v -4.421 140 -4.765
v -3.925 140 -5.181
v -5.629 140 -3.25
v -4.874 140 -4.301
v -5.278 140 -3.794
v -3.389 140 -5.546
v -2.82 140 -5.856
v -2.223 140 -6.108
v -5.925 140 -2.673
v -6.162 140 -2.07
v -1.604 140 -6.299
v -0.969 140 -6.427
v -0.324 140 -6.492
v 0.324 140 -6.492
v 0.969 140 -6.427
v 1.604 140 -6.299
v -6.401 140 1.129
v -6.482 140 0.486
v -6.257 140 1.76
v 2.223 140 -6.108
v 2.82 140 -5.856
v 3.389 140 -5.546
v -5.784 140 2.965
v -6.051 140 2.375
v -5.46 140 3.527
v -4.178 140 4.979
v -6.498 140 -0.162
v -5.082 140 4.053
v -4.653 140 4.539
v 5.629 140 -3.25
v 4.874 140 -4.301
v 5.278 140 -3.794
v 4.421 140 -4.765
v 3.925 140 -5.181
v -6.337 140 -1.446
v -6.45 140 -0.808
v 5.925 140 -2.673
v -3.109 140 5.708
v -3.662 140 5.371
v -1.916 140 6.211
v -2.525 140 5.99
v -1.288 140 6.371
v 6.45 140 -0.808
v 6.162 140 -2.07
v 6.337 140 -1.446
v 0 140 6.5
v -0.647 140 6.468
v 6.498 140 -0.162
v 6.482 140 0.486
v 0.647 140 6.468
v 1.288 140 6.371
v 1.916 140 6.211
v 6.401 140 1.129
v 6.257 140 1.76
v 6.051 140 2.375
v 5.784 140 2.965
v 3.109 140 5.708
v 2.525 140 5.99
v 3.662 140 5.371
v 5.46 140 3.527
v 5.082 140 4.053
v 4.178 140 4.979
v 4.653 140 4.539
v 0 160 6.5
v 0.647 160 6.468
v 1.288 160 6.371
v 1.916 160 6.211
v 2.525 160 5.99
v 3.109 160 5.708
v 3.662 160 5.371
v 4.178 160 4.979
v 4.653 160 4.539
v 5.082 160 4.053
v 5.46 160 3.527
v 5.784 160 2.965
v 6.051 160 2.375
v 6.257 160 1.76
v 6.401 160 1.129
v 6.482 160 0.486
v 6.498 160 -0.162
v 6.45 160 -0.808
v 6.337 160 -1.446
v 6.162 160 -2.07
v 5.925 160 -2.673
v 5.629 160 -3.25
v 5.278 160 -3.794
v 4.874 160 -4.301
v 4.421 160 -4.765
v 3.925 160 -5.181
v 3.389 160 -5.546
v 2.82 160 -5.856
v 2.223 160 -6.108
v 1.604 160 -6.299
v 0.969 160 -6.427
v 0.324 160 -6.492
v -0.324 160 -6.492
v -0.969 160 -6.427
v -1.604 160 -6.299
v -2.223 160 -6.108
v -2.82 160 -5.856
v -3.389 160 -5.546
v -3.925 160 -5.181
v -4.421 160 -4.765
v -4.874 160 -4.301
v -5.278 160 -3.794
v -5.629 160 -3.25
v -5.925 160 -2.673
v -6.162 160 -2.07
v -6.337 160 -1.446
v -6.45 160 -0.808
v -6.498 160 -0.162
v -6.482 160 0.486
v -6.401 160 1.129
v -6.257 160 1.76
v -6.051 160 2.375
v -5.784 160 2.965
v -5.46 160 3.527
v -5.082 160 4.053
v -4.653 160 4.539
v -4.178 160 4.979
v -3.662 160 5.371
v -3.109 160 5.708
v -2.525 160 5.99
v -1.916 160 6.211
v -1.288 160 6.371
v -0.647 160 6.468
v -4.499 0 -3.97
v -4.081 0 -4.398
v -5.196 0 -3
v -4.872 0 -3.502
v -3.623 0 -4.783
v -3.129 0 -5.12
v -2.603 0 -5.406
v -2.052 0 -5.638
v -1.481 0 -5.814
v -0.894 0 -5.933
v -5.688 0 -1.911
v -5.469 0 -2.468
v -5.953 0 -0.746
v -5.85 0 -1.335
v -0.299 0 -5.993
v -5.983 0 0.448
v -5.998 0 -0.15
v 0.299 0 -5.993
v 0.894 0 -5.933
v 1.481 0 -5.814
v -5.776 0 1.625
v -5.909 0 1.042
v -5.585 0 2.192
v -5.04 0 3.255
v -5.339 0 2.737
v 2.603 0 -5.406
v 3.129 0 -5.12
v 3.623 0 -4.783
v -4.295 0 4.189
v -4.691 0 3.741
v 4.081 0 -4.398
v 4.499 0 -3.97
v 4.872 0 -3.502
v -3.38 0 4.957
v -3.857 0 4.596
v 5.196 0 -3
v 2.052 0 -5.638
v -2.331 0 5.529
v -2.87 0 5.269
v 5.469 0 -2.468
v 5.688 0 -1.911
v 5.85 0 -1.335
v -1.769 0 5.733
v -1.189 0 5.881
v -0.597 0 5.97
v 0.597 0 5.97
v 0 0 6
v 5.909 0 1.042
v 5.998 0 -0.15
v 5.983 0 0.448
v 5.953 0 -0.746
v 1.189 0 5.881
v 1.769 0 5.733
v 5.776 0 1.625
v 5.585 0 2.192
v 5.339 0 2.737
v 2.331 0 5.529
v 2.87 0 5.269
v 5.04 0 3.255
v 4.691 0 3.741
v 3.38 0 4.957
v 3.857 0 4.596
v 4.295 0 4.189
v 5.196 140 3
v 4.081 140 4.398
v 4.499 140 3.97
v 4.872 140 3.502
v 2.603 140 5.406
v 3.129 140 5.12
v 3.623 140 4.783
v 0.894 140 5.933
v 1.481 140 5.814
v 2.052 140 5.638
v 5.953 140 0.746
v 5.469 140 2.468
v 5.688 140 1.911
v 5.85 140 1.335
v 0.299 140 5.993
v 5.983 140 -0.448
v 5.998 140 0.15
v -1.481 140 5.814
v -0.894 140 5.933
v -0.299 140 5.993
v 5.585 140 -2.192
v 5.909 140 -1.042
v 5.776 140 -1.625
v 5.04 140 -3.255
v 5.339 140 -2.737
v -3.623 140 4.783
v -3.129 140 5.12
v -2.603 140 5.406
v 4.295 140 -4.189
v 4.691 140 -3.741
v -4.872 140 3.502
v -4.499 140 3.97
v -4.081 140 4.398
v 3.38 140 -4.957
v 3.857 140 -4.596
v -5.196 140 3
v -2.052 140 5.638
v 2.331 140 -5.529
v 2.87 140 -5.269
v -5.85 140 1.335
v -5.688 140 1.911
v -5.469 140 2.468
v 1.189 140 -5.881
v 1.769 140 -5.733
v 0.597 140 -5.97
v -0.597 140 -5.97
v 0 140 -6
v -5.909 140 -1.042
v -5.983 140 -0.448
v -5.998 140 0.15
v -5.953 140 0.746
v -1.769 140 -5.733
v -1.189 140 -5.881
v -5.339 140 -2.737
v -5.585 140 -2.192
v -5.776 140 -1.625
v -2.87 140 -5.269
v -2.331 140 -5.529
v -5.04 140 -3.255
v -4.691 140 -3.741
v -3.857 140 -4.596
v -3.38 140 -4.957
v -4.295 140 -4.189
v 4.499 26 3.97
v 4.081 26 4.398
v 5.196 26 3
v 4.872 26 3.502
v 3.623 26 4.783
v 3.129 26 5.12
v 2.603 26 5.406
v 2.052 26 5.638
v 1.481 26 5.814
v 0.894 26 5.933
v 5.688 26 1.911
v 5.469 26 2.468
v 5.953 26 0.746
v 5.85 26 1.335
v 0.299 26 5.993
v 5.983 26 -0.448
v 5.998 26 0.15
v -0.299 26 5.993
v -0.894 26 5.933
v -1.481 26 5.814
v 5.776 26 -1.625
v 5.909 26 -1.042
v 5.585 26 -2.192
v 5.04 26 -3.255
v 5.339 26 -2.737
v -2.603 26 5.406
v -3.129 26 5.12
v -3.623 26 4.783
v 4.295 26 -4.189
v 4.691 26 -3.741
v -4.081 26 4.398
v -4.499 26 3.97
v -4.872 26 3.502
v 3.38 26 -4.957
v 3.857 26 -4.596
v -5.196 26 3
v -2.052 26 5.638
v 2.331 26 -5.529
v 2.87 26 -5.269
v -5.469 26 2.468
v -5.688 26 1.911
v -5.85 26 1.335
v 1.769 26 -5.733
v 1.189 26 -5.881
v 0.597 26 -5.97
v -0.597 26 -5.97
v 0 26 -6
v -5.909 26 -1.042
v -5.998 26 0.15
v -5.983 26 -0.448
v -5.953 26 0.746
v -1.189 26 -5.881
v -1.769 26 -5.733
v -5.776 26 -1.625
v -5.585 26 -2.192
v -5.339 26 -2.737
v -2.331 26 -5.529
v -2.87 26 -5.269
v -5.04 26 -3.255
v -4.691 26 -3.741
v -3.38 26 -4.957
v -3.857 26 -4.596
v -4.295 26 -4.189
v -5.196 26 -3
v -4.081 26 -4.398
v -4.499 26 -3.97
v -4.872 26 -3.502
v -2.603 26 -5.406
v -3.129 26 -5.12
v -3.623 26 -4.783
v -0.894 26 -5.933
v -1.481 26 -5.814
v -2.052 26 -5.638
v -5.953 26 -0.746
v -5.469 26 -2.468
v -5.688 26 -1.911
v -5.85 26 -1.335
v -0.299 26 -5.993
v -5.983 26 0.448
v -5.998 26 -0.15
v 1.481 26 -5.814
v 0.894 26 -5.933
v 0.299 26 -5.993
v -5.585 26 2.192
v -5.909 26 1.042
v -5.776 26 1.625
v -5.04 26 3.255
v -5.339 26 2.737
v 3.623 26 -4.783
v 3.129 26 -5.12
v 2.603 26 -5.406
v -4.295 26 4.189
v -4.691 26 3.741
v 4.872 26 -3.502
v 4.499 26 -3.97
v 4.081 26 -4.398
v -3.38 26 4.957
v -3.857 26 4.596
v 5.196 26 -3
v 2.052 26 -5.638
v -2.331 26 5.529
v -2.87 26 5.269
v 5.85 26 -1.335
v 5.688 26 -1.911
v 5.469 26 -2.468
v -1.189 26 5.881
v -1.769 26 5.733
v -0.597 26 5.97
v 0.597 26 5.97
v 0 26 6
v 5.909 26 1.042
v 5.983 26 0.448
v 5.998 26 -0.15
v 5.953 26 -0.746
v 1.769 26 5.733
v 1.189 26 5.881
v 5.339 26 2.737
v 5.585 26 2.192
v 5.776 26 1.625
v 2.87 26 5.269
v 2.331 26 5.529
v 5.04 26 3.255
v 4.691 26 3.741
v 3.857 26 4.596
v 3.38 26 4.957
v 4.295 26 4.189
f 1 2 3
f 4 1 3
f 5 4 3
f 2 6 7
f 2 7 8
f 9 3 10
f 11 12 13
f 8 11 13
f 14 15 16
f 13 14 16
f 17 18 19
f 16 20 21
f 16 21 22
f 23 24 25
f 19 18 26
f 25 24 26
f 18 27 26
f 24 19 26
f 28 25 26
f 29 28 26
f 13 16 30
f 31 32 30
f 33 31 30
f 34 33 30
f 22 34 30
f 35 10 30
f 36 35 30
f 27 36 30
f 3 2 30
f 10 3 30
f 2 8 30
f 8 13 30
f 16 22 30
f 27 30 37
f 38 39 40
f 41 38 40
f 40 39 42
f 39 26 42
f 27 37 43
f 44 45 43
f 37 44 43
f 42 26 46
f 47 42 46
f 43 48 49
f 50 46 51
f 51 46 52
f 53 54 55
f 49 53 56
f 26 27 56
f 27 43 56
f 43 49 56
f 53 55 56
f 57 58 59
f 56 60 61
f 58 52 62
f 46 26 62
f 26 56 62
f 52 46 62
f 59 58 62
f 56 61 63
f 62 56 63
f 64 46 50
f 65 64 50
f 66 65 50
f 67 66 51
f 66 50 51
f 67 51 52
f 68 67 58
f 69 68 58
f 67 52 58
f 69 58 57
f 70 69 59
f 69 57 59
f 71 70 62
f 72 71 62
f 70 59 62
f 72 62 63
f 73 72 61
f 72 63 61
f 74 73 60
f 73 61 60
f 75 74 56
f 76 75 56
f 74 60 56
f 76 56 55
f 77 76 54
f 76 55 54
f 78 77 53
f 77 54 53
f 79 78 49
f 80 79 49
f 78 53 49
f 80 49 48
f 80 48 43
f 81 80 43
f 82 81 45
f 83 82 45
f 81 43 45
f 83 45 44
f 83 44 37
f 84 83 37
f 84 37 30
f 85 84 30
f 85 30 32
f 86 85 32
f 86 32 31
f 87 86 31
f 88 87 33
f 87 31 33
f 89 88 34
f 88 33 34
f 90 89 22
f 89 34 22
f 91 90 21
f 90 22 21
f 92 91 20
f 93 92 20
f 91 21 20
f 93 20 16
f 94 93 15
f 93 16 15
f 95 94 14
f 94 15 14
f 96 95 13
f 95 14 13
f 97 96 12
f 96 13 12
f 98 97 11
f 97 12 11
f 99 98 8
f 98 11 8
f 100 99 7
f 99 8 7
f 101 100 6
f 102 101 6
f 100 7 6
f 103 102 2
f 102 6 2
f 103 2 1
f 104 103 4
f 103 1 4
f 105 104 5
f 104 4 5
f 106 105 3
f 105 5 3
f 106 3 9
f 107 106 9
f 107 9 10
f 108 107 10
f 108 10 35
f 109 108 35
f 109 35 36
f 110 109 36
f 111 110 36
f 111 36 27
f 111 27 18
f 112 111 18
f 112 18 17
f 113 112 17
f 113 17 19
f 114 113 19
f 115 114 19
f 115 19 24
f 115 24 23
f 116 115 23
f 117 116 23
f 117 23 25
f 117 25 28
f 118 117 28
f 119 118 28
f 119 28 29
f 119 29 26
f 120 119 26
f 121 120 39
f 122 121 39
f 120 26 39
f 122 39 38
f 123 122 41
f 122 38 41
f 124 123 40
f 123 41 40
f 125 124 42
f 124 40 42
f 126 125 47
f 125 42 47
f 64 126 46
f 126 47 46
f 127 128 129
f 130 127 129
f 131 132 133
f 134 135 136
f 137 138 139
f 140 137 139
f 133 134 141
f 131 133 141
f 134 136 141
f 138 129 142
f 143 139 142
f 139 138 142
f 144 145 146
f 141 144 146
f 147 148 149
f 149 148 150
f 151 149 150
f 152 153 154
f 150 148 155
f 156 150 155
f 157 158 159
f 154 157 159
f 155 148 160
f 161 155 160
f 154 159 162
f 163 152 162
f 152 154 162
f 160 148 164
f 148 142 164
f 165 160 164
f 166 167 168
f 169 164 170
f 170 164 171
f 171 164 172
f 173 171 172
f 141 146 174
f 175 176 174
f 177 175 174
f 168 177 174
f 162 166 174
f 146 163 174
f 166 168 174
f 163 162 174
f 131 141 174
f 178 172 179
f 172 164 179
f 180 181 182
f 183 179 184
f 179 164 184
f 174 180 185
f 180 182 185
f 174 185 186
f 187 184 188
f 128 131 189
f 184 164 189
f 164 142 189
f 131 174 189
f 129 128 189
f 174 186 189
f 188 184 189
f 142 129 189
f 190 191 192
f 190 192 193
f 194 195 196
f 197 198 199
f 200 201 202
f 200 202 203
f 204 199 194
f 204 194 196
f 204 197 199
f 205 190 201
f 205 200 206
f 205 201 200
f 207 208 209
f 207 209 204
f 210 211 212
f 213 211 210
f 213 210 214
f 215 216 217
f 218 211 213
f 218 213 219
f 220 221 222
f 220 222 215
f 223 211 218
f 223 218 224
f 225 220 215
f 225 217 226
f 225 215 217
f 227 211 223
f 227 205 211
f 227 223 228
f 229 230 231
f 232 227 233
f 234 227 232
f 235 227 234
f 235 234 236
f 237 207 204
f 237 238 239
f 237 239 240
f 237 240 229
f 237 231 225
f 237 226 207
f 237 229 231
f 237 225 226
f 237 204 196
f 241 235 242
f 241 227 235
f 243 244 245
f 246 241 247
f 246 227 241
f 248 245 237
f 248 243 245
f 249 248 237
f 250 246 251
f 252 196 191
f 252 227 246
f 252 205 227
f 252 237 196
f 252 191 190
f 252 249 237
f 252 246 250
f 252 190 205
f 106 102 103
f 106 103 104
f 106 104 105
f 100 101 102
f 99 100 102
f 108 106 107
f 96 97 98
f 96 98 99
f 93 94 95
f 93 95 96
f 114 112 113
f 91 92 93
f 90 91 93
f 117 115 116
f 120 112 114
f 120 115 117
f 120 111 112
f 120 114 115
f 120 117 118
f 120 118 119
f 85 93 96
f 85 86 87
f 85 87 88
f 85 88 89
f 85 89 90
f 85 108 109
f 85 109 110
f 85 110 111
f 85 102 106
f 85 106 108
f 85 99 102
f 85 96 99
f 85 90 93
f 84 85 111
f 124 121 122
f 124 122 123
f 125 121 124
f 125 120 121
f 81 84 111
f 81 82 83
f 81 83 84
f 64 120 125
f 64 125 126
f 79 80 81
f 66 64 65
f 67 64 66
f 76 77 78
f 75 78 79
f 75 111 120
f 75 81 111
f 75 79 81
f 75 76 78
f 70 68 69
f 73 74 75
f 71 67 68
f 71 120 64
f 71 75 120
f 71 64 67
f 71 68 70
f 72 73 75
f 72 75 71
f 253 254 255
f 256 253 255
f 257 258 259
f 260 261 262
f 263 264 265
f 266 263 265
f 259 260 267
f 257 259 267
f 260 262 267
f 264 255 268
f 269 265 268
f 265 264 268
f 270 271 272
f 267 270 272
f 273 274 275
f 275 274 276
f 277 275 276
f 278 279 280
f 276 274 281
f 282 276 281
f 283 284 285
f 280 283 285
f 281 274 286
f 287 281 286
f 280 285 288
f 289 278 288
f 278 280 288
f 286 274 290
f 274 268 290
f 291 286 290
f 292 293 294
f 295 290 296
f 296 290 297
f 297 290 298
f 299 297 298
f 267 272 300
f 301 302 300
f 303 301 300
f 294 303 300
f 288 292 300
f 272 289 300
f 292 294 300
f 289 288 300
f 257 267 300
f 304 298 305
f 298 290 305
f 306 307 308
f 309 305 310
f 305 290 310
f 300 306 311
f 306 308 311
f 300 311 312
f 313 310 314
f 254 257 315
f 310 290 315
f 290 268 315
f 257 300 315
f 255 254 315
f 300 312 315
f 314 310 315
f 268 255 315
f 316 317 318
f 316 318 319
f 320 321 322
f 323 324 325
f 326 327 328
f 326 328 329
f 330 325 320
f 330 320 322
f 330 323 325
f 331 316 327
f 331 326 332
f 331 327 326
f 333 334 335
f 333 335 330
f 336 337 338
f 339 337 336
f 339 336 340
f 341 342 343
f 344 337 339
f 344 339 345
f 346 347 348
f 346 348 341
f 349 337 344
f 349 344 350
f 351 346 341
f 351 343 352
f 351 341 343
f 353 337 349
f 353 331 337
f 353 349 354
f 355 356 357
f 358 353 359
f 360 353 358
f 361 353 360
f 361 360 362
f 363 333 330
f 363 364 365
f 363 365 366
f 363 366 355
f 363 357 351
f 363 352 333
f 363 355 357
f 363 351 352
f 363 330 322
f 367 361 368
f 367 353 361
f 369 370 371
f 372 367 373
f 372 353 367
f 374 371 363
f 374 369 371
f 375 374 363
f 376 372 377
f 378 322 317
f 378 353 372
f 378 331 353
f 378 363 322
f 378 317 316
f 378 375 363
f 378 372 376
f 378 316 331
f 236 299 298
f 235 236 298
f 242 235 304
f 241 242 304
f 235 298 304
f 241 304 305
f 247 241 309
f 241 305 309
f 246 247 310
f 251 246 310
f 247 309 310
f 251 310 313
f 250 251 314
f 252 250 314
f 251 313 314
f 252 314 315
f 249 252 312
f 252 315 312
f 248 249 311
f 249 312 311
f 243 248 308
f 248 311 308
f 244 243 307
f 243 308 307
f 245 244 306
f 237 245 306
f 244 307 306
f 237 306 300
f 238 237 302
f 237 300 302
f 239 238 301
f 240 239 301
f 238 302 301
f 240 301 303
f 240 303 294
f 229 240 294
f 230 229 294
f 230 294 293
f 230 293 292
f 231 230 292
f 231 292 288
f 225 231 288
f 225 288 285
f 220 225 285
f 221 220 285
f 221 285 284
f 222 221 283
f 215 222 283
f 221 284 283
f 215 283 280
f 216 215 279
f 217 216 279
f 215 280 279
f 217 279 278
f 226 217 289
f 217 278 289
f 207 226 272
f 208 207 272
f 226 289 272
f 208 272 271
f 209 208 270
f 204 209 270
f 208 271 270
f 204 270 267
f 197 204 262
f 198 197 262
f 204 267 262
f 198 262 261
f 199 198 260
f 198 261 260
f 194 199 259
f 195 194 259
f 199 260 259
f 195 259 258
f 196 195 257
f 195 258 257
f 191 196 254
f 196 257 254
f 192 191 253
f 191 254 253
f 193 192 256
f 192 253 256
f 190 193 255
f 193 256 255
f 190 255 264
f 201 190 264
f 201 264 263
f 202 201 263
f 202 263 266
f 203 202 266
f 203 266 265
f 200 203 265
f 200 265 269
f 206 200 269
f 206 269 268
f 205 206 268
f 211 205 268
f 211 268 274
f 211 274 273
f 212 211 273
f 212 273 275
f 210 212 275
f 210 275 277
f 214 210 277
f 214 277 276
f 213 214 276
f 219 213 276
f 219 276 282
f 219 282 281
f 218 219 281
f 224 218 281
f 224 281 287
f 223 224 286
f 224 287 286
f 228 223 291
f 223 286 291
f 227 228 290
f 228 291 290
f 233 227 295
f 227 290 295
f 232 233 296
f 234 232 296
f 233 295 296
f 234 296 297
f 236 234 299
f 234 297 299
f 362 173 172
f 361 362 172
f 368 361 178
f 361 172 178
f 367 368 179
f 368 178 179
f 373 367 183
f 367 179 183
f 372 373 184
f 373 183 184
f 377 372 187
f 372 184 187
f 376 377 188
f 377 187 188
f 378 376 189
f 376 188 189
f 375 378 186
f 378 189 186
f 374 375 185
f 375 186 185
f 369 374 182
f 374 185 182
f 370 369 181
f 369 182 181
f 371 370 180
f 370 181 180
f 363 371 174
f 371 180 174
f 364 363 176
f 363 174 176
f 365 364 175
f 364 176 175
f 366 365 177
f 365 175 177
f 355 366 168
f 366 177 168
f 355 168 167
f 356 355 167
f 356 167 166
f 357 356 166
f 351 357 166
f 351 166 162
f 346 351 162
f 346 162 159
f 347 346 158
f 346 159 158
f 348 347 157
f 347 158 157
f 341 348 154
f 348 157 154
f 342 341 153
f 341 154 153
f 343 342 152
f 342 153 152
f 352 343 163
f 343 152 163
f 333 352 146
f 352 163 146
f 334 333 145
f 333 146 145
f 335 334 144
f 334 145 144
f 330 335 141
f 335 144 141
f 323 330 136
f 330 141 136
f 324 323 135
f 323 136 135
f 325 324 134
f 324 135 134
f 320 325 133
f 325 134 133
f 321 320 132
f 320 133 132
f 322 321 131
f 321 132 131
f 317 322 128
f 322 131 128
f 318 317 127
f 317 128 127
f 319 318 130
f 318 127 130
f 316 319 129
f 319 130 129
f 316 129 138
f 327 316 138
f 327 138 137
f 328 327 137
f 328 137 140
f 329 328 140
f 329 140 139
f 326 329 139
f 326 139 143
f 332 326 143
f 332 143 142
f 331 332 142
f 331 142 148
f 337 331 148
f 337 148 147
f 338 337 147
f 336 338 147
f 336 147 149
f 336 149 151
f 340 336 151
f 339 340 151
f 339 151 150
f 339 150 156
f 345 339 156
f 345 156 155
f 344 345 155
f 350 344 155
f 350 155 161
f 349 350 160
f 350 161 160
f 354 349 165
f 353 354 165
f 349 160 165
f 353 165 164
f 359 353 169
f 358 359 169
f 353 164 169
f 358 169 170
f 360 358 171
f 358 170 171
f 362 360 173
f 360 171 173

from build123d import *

# Parameters (mm, degrees)
SK_BULB_GUARD_R      = 6
BULB_GUARD_DEPTH     = 26
ELECTRODE_START      = 26
SK_ELECTRODE_BODY_R  = 6
ELECTRODE_BODY_DEPTH = 114
ELECTRODE_START_2    = 140
SK_ELECTRODE_CAP_R   = 6.5
ELECTRODE_CAP_DEPTH  = 20


with BuildPart() as part:
    # SK Bulb guard → Bulb guard (new body)
    with BuildSketch(Plane(origin=(0, 0, 0), x_dir=(1, 0, 0), z_dir=(0, 1, 0))):
        Circle(SK_BULB_GUARD_R)
    extrude(amount=BULB_GUARD_DEPTH)


with BuildPart() as body_2:
    # SK Electrode body → Electrode body (new body)
    with BuildSketch(Plane(origin=(0, 0, 0), x_dir=(1, 0, 0), z_dir=(0, 1, 0)).offset(ELECTRODE_START)):
        Circle(SK_ELECTRODE_BODY_R)
    extrude(amount=ELECTRODE_BODY_DEPTH)


with BuildPart() as body_3:
    # SK Electrode cap → Electrode cap (new body)
    with BuildSketch(Plane(origin=(0, 0, 0), x_dir=(1, 0, 0), z_dir=(0, 1, 0)).offset(ELECTRODE_START_2)):
        Circle(SK_ELECTRODE_CAP_R)
    extrude(amount=ELECTRODE_CAP_DEPTH)


solid = Compound([part.part, body_2.part, body_3.part])
